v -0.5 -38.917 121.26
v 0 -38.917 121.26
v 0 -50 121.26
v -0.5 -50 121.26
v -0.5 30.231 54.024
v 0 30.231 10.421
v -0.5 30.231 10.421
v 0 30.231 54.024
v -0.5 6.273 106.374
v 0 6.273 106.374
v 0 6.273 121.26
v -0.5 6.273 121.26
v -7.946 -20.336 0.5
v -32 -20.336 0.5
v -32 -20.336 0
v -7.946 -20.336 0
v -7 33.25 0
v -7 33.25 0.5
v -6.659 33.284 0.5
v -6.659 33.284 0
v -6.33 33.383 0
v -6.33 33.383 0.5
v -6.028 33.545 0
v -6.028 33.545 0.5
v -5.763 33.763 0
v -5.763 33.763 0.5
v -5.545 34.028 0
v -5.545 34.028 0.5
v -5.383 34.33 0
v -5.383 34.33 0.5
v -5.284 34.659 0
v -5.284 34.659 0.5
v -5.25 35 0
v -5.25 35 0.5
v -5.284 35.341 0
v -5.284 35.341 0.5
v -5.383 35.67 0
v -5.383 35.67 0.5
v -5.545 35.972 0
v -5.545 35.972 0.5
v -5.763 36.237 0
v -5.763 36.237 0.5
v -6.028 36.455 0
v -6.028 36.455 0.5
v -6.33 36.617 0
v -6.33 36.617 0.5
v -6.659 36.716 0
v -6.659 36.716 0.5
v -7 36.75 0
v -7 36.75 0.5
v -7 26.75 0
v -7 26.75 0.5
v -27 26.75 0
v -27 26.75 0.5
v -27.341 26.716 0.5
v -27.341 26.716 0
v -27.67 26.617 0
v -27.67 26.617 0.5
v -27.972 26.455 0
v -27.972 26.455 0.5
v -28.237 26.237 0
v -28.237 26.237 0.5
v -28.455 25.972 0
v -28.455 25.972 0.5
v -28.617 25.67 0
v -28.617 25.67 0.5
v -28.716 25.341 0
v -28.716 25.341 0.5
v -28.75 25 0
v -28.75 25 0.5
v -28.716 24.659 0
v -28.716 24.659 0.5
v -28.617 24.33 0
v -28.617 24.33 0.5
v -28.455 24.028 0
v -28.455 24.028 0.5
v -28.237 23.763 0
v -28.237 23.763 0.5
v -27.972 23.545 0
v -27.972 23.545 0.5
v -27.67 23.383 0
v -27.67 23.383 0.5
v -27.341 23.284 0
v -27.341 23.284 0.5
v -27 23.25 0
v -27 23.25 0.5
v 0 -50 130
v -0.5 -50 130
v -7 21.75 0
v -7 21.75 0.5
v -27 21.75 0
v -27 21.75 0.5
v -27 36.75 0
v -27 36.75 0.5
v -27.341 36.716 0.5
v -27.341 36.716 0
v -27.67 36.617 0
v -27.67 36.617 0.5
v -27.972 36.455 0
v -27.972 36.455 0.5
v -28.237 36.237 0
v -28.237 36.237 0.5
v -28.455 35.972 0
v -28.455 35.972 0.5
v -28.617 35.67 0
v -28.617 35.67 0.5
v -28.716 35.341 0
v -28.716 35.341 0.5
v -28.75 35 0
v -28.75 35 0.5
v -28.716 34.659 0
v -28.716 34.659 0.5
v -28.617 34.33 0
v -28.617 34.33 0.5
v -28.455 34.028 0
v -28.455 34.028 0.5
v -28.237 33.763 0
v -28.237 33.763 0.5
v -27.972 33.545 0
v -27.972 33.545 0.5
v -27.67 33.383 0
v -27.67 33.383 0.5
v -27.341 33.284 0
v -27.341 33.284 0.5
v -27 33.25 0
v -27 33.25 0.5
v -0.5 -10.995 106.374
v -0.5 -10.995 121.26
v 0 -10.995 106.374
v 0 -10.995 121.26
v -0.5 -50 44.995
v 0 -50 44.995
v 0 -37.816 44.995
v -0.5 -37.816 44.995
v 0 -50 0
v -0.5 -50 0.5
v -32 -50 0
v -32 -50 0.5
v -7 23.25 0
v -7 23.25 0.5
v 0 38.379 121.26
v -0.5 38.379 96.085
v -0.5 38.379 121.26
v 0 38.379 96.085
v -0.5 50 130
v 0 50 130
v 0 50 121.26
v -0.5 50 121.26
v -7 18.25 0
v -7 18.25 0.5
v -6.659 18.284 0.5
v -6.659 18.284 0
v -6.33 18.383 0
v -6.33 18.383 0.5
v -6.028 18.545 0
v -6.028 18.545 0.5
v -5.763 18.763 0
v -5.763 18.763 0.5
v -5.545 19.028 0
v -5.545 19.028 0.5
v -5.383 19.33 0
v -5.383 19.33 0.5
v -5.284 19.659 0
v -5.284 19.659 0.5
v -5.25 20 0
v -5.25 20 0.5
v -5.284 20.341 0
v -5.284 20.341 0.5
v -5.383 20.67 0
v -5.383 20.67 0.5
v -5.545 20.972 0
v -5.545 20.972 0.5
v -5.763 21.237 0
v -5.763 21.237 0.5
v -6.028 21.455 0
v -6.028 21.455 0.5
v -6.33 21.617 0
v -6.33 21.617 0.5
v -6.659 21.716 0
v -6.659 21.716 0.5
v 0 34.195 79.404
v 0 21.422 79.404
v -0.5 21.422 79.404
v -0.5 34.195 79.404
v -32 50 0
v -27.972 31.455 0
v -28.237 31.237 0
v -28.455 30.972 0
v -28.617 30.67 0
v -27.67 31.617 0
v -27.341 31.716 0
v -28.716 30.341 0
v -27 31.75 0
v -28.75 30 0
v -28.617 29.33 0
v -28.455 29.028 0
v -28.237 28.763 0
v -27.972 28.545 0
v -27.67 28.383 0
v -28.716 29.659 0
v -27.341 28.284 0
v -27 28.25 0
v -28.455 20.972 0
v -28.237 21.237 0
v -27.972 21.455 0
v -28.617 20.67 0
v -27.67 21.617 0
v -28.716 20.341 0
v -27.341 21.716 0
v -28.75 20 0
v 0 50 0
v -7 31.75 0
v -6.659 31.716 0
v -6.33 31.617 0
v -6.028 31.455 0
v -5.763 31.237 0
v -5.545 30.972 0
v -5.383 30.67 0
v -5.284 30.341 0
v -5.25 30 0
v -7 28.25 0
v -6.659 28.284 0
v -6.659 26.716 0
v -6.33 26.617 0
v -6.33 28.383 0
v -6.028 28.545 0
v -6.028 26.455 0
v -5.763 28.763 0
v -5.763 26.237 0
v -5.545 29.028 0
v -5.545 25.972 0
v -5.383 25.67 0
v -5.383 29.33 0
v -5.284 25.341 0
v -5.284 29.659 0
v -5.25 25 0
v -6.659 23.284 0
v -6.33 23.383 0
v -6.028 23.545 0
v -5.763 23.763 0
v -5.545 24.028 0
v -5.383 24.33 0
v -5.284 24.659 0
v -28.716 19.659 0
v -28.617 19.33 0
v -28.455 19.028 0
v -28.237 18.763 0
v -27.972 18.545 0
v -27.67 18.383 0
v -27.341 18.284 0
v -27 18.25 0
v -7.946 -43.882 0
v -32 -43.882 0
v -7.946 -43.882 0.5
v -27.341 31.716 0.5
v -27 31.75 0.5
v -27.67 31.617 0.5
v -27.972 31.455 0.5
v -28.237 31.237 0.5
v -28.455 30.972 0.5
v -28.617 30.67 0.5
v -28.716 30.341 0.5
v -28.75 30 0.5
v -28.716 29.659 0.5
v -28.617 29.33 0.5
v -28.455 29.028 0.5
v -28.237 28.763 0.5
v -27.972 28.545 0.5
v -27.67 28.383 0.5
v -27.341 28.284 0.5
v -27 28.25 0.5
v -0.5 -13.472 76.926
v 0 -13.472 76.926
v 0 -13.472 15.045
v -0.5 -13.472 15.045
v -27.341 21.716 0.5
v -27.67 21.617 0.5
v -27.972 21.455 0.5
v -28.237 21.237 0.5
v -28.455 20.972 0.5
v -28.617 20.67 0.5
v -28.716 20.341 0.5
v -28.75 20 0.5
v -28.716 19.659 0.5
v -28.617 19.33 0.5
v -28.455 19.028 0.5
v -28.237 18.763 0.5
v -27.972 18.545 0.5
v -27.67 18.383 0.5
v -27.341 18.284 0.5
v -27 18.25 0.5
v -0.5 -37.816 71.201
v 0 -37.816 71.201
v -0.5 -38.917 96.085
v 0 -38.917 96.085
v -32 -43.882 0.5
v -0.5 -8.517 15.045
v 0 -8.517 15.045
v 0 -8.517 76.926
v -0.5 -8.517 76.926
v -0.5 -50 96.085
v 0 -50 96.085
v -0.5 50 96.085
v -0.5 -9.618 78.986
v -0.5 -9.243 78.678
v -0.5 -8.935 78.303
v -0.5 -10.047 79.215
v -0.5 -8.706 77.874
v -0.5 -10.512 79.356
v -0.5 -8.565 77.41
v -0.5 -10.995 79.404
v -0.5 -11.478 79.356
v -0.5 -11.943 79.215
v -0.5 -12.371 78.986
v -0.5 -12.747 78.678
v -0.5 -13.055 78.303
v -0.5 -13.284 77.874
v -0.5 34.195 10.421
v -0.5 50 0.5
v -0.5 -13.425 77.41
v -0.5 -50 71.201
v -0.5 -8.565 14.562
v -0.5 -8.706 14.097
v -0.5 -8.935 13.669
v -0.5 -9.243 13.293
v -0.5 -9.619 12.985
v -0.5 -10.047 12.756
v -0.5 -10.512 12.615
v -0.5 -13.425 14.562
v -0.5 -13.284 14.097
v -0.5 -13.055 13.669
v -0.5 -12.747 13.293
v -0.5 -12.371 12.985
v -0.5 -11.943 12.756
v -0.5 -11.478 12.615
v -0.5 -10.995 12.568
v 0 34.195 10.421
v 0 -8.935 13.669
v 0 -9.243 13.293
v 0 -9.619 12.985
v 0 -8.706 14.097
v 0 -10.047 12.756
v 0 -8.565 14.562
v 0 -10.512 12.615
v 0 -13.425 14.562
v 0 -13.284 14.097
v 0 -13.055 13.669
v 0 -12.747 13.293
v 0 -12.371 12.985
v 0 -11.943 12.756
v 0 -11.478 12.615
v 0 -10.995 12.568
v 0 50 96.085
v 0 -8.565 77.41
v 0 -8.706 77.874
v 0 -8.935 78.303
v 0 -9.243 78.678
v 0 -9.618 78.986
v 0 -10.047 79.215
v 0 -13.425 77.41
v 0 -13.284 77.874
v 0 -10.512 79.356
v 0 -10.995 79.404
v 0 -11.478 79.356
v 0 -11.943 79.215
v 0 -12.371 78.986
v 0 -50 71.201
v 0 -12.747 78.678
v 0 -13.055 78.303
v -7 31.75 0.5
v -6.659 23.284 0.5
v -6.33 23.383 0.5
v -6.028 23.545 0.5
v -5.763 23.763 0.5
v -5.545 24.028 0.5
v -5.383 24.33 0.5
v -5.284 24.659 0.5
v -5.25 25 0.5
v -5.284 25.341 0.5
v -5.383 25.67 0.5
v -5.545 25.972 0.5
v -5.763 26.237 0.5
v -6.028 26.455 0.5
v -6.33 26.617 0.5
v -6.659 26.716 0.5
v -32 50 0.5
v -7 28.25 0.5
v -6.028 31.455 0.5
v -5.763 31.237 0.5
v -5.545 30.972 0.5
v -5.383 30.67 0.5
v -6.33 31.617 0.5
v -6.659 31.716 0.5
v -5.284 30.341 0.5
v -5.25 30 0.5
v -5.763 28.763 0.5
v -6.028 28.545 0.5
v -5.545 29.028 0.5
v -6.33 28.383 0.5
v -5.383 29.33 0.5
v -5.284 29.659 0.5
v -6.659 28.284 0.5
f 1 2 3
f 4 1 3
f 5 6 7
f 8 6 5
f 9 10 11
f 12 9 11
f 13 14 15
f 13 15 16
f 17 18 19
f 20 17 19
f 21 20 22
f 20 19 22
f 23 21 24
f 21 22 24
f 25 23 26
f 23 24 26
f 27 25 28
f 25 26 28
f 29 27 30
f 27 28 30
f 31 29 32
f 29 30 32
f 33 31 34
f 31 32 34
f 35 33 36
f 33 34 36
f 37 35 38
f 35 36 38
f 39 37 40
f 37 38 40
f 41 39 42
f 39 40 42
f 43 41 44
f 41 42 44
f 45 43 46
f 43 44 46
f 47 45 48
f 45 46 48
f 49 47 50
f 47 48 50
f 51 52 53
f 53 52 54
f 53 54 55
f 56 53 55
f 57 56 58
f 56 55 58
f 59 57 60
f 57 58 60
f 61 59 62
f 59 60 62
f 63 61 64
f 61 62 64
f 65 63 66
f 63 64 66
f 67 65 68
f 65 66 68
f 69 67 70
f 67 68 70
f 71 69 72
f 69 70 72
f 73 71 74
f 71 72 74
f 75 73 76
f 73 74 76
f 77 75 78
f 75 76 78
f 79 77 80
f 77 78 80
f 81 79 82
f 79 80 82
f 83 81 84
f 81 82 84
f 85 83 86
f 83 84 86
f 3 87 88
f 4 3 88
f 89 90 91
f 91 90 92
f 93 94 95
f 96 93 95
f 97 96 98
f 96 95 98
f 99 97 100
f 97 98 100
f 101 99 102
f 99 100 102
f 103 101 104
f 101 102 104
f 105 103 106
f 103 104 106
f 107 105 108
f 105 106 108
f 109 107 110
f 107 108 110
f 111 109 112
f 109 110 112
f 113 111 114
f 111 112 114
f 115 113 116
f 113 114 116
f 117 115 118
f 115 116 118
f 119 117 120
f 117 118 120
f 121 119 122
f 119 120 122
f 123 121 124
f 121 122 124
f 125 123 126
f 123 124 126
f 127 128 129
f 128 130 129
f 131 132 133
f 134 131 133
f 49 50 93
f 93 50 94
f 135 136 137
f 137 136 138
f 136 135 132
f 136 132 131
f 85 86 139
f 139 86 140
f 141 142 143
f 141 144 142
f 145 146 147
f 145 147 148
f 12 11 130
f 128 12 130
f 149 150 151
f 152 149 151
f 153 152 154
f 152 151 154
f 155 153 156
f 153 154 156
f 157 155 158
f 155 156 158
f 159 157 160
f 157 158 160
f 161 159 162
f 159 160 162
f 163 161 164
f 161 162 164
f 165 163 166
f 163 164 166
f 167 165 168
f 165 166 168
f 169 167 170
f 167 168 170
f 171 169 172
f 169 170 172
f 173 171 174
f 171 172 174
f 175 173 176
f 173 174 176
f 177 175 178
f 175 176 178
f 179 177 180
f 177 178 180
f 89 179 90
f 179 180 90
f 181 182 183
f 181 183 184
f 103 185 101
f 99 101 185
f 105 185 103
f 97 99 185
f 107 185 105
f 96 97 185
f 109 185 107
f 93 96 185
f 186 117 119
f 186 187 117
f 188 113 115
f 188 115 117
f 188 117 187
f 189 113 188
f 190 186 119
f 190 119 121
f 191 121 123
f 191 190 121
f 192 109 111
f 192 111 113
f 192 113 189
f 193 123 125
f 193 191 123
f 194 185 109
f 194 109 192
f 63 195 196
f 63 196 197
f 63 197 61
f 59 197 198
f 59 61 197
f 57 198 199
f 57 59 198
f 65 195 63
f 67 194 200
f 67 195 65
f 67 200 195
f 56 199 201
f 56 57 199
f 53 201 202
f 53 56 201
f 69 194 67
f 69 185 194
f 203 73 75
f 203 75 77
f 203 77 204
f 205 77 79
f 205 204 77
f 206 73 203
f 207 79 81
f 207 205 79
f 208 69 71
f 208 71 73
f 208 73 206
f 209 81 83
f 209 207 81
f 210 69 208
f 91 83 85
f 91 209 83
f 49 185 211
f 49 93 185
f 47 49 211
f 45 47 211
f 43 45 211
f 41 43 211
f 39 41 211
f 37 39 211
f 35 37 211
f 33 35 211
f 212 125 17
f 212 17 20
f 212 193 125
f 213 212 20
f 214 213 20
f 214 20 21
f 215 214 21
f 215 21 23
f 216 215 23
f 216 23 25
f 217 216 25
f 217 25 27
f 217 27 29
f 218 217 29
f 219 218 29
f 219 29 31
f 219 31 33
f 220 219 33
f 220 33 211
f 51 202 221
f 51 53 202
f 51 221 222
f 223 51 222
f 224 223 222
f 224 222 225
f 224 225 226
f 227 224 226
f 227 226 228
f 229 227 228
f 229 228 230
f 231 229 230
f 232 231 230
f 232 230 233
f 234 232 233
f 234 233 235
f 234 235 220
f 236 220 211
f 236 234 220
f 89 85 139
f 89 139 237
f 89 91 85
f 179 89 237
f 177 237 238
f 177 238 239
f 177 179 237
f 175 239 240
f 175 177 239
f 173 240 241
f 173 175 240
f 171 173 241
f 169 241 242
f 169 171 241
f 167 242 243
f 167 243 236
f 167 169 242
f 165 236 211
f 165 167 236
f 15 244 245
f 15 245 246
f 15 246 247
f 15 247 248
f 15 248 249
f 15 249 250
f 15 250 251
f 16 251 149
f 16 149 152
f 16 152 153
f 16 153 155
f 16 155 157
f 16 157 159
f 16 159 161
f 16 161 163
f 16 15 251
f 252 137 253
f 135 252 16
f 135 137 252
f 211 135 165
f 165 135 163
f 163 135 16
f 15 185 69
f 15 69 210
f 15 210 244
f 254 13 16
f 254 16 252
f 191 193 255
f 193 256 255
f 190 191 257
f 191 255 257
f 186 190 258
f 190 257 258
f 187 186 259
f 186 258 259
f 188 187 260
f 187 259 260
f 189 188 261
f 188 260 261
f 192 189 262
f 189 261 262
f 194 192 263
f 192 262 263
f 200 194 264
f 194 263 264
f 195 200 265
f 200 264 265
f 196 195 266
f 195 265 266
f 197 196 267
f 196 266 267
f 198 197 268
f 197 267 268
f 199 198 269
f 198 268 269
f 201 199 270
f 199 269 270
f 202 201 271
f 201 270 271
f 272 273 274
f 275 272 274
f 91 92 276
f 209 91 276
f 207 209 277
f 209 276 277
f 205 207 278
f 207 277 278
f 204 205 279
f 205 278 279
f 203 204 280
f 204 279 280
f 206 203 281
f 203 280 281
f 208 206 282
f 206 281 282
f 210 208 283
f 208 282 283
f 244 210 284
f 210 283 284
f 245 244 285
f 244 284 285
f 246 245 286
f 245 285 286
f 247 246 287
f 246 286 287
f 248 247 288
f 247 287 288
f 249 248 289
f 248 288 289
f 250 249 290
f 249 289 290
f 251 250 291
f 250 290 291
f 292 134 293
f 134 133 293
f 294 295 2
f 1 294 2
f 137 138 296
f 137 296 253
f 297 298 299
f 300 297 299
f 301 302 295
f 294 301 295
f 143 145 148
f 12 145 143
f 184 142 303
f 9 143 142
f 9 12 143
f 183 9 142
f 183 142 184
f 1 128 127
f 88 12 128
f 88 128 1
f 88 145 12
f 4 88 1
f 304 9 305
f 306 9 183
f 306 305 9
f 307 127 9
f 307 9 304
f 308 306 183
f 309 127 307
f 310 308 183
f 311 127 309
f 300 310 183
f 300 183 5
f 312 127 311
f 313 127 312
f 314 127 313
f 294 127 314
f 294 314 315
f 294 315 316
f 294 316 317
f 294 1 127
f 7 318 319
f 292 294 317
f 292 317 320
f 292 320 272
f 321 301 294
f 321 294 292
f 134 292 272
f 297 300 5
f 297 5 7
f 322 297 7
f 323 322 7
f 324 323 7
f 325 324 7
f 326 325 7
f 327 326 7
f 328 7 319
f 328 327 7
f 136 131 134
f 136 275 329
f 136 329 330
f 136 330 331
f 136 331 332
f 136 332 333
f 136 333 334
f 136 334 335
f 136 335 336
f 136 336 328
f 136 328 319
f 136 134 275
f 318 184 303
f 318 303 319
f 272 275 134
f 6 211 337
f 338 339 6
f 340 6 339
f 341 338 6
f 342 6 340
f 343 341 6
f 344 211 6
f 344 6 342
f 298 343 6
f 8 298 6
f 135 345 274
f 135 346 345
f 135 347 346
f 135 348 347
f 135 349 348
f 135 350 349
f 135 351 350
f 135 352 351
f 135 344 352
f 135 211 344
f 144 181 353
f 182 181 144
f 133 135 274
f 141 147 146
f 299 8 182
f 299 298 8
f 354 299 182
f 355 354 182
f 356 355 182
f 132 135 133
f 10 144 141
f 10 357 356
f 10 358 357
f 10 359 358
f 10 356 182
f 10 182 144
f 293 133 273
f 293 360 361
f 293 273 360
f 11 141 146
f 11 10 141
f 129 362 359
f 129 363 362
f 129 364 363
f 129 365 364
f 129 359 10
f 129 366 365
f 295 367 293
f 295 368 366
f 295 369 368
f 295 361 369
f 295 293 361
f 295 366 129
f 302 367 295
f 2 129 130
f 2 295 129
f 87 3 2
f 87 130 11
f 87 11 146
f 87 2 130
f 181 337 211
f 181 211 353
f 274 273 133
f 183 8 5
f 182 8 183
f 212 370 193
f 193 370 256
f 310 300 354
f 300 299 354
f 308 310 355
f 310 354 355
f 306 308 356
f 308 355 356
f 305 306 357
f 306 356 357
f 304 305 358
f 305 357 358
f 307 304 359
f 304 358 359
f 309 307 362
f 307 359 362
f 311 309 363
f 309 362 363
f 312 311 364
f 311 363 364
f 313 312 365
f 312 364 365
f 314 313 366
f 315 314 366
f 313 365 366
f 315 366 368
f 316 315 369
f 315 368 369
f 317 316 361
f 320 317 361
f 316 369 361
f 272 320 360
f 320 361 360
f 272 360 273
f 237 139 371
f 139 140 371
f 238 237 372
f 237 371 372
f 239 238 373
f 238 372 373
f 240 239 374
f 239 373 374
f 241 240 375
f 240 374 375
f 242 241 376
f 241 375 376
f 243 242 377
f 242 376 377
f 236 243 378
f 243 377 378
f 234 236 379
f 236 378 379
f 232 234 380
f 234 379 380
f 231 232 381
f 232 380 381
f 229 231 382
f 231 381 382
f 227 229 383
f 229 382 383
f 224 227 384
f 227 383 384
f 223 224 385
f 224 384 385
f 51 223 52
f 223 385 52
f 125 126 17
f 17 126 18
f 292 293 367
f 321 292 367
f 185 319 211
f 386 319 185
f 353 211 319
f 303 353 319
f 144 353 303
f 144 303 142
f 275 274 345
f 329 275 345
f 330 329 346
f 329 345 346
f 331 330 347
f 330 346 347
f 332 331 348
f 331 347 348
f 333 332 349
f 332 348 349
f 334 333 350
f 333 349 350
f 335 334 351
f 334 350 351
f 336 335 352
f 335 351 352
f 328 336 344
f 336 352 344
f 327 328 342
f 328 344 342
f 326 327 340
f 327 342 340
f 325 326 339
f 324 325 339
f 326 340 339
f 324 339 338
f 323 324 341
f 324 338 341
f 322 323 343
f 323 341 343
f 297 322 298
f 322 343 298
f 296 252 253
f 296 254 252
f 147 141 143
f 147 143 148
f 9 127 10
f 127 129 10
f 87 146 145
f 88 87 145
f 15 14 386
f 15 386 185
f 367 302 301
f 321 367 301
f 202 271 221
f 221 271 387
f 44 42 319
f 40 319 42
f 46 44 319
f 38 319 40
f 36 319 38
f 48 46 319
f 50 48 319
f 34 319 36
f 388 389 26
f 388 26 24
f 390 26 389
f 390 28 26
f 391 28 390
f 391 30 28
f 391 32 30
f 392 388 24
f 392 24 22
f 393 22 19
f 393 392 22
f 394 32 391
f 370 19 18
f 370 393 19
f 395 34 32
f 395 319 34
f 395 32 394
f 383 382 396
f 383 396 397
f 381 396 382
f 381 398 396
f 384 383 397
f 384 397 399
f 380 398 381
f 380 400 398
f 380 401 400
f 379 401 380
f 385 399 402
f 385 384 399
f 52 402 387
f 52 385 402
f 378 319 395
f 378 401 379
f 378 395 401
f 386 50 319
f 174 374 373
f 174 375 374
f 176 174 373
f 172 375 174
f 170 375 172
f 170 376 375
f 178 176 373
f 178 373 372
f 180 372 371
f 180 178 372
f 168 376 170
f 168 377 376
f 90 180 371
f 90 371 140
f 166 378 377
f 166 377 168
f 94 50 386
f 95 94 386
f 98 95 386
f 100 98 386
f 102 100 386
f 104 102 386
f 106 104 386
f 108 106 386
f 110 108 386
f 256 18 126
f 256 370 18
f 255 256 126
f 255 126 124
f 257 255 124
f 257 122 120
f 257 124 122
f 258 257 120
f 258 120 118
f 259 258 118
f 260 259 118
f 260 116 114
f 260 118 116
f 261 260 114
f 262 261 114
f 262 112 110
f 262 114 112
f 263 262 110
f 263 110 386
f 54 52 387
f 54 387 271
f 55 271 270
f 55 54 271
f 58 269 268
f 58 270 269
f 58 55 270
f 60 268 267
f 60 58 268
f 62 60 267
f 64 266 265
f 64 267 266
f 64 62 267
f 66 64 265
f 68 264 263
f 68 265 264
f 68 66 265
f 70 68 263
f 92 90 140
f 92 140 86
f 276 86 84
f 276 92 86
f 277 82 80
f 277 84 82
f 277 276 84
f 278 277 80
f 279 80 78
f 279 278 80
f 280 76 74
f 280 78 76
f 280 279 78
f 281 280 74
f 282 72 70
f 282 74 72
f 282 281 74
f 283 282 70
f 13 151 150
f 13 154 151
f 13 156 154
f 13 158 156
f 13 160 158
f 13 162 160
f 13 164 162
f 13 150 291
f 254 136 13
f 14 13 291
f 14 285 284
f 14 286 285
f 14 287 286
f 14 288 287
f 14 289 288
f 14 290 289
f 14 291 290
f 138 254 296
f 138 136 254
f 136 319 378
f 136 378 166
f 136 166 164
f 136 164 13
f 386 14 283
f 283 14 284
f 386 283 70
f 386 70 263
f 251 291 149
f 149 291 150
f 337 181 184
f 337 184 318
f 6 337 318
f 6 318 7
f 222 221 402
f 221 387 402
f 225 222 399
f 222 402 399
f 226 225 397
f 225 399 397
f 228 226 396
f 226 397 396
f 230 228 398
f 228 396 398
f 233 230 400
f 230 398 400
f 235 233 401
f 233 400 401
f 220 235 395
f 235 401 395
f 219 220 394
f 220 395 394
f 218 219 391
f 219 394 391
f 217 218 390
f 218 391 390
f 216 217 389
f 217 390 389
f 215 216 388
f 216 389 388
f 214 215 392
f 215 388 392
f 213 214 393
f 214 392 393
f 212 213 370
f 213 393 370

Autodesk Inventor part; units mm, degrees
ref_plane "YZ Plane" through (0, 0, 0) normal (1, 0, 0) x (0, 1, 0)
ref_plane "XZ Plane" through (0, 0, 0) normal (0, 1, 0) x (-1, 0, 0)
ref_plane "XY Plane" through (0, 0, 0) normal (0, 0, 1) x (1, 0, 0)
sketch "Sketch1" plane through (0, 0, 0) normal (0, 1, 0) x (-1, 0, 0)
  line L0 (0, 0) -> (0, 130)
  line L1 (0, 130) -> (0.5, 130)
  line L2 (0.5, 130) -> (0.5, 0.5)
  line L3 (0.5, 0.5) -> (32, 0.5)
  line L4 (32, 0.5) -> (32, 0)
  line L5 (32, 0) -> (0, 0)
  dimension "d0" = 0.5
  dimension "d1" = 130
  dimension "d2" = 32
extrude "Extrusion1" add sketch "Sketch1" along normal mid plane 100
sketch "Sketch2" plane through (0, -50, 0) normal (1, 0, 0) x (0, 0, -1)
  line L0 (-121.2604, 39.005) -> (-106.3744, 39.005)
  line L1 (-106.3744, 39.005) -> (-106.3744, 56.2727)
  line L2 (-106.3744, 56.2727) -> (-121.2604, 56.2727)
  line L3 (-121.2604, 56.2727) -> (-121.2604, 39.005)
  line L4 (-121.2604, -4.0598) -> (-96.0852, -4.0598)
  line L5 (-96.0852, -4.0598) -> (-96.0852, 11.0828)
  line L6 (-96.0852, 11.0828) -> (-121.2604, 11.0828)
  line L7 (-121.2604, 11.0828) -> (-121.2604, -4.0598)
  line L8 (-71.2006, -4.0598) -> (-44.9947, -4.0598)
  line L9 (-44.9947, -4.0598) -> (-44.9947, 12.1839)
  line L10 (-44.9947, 12.1839) -> (-71.2006, 12.1839)
  line L11 (-71.2006, 12.1839) -> (-71.2006, -4.0598)
  line L12 (-121.2604, 102.7324) -> (-96.0852, 102.7324)
  line L13 (-96.0852, 102.7324) -> (-96.0852, 88.3791)
  line L14 (-96.0852, 88.3791) -> (-121.2604, 88.3791)
  line L15 (-121.2604, 88.3791) -> (-121.2604, 102.7324)
  line L16 (-15.0452, 39.005) -> (-76.9263, 39.005) construction
  line L17 (-15.0452, 41.4826) -> (-76.9263, 41.4826)
  line L18 (-76.9263, 36.5275) -> (-15.0452, 36.5275)
  arc A0 (-15.0452, 36.5275) -> (-15.0452, 41.4826) centre (-15.0452, 39.005) ccw
  arc A1 (-76.9263, 41.4826) -> (-76.9263, 36.5275) centre (-76.9263, 39.005) ccw
  line L19 (-79.4038, 71.4223) -> (-79.4038, 84.1949)
  line L20 (-79.4038, 84.1949) -> (-10.4206, 84.1949)
  line L21 (-10.4206, 84.1949) -> (-10.4206, 80.231)
  line L22 (-10.4206, 80.231) -> (-54.0237, 80.231)
  line L23 (-54.0237, 80.231) -> (-79.4038, 71.4223)
  point P0 (0, 50)
  point P1 (-45.9857, 39.005)
extrude "Extrusion2" cut sketch "Sketch2" against normal blind 100
sketch "Sketch3" plane through (-32, 50, 0.5) normal (0, 0, 1) x (1, 0, 0)
  line L0 (5, -15) -> (25, -15) construction
  line L1 (5, -16.75) -> (25, -16.75)
  line L2 (25, -13.25) -> (5, -13.25)
  arc A0 (5, -13.25) -> (5, -16.75) centre (5, -15) ccw
  arc A1 (25, -16.75) -> (25, -13.25) centre (25, -15) ccw
  line L3 (5, -20) -> (25, -20) construction
  line L4 (5, -21.75) -> (25, -21.75)
  line L5 (25, -18.25) -> (5, -18.25)
  arc A2 (5, -18.25) -> (5, -21.75) centre (5, -20) ccw
  arc A3 (25, -21.75) -> (25, -18.25) centre (25, -20) ccw
  line L6 (5, -25) -> (25, -25) construction
  line L7 (5, -26.75) -> (25, -26.75)
  line L8 (25, -23.25) -> (5, -23.25)
  arc A4 (5, -23.25) -> (5, -26.75) centre (5, -25) ccw
  arc A5 (25, -26.75) -> (25, -23.25) centre (25, -25) ccw
  line L9 (5, -30) -> (25, -30) construction
  line L10 (5, -31.75) -> (25, -31.75)
  line L11 (25, -28.25) -> (5, -28.25)
  arc A6 (5, -28.25) -> (5, -31.75) centre (5, -30) ccw
  arc A7 (25, -31.75) -> (25, -28.25) centre (25, -30) ccw
  line L12 (15, -15) -> (15, -20)
  line L13 (15, -20) -> (15, -25)
  line L14 (15, -25) -> (15, -30)
  line L15 (0, 0) -> (0, -100) projected
  line L16 (0, 0) -> (31.5, 0) projected
  point P0 (32, -50)
  dimension "d7" = 1.75
  dimension "d8" = 15
  dimension "d9" = 20
  dimension "d10" = 15
  dimension "d11" = 5
extrude "Extrusion3" cut sketch "Sketch3" against normal blind 100
sketch "Sketch4" plane through (-32, 50, 0.5) normal (0, 0, 1) x (1, 0, 0)
  line L0 (-3.8096, -70.3357) -> (24.0538, -70.3357)
  line L1 (24.0538, -70.3357) -> (24.0538, -93.8822)
  line L2 (24.0538, -93.8822) -> (-3.8096, -93.8822)
  line L3 (-3.8096, -93.8822) -> (-3.8096, -70.3357)
  point P0 (32, -50)
extrude "Extrusion4" cut sketch "Sketch4" against normal through all
properties part number "Platina lateral interna 1" material "Steel"
